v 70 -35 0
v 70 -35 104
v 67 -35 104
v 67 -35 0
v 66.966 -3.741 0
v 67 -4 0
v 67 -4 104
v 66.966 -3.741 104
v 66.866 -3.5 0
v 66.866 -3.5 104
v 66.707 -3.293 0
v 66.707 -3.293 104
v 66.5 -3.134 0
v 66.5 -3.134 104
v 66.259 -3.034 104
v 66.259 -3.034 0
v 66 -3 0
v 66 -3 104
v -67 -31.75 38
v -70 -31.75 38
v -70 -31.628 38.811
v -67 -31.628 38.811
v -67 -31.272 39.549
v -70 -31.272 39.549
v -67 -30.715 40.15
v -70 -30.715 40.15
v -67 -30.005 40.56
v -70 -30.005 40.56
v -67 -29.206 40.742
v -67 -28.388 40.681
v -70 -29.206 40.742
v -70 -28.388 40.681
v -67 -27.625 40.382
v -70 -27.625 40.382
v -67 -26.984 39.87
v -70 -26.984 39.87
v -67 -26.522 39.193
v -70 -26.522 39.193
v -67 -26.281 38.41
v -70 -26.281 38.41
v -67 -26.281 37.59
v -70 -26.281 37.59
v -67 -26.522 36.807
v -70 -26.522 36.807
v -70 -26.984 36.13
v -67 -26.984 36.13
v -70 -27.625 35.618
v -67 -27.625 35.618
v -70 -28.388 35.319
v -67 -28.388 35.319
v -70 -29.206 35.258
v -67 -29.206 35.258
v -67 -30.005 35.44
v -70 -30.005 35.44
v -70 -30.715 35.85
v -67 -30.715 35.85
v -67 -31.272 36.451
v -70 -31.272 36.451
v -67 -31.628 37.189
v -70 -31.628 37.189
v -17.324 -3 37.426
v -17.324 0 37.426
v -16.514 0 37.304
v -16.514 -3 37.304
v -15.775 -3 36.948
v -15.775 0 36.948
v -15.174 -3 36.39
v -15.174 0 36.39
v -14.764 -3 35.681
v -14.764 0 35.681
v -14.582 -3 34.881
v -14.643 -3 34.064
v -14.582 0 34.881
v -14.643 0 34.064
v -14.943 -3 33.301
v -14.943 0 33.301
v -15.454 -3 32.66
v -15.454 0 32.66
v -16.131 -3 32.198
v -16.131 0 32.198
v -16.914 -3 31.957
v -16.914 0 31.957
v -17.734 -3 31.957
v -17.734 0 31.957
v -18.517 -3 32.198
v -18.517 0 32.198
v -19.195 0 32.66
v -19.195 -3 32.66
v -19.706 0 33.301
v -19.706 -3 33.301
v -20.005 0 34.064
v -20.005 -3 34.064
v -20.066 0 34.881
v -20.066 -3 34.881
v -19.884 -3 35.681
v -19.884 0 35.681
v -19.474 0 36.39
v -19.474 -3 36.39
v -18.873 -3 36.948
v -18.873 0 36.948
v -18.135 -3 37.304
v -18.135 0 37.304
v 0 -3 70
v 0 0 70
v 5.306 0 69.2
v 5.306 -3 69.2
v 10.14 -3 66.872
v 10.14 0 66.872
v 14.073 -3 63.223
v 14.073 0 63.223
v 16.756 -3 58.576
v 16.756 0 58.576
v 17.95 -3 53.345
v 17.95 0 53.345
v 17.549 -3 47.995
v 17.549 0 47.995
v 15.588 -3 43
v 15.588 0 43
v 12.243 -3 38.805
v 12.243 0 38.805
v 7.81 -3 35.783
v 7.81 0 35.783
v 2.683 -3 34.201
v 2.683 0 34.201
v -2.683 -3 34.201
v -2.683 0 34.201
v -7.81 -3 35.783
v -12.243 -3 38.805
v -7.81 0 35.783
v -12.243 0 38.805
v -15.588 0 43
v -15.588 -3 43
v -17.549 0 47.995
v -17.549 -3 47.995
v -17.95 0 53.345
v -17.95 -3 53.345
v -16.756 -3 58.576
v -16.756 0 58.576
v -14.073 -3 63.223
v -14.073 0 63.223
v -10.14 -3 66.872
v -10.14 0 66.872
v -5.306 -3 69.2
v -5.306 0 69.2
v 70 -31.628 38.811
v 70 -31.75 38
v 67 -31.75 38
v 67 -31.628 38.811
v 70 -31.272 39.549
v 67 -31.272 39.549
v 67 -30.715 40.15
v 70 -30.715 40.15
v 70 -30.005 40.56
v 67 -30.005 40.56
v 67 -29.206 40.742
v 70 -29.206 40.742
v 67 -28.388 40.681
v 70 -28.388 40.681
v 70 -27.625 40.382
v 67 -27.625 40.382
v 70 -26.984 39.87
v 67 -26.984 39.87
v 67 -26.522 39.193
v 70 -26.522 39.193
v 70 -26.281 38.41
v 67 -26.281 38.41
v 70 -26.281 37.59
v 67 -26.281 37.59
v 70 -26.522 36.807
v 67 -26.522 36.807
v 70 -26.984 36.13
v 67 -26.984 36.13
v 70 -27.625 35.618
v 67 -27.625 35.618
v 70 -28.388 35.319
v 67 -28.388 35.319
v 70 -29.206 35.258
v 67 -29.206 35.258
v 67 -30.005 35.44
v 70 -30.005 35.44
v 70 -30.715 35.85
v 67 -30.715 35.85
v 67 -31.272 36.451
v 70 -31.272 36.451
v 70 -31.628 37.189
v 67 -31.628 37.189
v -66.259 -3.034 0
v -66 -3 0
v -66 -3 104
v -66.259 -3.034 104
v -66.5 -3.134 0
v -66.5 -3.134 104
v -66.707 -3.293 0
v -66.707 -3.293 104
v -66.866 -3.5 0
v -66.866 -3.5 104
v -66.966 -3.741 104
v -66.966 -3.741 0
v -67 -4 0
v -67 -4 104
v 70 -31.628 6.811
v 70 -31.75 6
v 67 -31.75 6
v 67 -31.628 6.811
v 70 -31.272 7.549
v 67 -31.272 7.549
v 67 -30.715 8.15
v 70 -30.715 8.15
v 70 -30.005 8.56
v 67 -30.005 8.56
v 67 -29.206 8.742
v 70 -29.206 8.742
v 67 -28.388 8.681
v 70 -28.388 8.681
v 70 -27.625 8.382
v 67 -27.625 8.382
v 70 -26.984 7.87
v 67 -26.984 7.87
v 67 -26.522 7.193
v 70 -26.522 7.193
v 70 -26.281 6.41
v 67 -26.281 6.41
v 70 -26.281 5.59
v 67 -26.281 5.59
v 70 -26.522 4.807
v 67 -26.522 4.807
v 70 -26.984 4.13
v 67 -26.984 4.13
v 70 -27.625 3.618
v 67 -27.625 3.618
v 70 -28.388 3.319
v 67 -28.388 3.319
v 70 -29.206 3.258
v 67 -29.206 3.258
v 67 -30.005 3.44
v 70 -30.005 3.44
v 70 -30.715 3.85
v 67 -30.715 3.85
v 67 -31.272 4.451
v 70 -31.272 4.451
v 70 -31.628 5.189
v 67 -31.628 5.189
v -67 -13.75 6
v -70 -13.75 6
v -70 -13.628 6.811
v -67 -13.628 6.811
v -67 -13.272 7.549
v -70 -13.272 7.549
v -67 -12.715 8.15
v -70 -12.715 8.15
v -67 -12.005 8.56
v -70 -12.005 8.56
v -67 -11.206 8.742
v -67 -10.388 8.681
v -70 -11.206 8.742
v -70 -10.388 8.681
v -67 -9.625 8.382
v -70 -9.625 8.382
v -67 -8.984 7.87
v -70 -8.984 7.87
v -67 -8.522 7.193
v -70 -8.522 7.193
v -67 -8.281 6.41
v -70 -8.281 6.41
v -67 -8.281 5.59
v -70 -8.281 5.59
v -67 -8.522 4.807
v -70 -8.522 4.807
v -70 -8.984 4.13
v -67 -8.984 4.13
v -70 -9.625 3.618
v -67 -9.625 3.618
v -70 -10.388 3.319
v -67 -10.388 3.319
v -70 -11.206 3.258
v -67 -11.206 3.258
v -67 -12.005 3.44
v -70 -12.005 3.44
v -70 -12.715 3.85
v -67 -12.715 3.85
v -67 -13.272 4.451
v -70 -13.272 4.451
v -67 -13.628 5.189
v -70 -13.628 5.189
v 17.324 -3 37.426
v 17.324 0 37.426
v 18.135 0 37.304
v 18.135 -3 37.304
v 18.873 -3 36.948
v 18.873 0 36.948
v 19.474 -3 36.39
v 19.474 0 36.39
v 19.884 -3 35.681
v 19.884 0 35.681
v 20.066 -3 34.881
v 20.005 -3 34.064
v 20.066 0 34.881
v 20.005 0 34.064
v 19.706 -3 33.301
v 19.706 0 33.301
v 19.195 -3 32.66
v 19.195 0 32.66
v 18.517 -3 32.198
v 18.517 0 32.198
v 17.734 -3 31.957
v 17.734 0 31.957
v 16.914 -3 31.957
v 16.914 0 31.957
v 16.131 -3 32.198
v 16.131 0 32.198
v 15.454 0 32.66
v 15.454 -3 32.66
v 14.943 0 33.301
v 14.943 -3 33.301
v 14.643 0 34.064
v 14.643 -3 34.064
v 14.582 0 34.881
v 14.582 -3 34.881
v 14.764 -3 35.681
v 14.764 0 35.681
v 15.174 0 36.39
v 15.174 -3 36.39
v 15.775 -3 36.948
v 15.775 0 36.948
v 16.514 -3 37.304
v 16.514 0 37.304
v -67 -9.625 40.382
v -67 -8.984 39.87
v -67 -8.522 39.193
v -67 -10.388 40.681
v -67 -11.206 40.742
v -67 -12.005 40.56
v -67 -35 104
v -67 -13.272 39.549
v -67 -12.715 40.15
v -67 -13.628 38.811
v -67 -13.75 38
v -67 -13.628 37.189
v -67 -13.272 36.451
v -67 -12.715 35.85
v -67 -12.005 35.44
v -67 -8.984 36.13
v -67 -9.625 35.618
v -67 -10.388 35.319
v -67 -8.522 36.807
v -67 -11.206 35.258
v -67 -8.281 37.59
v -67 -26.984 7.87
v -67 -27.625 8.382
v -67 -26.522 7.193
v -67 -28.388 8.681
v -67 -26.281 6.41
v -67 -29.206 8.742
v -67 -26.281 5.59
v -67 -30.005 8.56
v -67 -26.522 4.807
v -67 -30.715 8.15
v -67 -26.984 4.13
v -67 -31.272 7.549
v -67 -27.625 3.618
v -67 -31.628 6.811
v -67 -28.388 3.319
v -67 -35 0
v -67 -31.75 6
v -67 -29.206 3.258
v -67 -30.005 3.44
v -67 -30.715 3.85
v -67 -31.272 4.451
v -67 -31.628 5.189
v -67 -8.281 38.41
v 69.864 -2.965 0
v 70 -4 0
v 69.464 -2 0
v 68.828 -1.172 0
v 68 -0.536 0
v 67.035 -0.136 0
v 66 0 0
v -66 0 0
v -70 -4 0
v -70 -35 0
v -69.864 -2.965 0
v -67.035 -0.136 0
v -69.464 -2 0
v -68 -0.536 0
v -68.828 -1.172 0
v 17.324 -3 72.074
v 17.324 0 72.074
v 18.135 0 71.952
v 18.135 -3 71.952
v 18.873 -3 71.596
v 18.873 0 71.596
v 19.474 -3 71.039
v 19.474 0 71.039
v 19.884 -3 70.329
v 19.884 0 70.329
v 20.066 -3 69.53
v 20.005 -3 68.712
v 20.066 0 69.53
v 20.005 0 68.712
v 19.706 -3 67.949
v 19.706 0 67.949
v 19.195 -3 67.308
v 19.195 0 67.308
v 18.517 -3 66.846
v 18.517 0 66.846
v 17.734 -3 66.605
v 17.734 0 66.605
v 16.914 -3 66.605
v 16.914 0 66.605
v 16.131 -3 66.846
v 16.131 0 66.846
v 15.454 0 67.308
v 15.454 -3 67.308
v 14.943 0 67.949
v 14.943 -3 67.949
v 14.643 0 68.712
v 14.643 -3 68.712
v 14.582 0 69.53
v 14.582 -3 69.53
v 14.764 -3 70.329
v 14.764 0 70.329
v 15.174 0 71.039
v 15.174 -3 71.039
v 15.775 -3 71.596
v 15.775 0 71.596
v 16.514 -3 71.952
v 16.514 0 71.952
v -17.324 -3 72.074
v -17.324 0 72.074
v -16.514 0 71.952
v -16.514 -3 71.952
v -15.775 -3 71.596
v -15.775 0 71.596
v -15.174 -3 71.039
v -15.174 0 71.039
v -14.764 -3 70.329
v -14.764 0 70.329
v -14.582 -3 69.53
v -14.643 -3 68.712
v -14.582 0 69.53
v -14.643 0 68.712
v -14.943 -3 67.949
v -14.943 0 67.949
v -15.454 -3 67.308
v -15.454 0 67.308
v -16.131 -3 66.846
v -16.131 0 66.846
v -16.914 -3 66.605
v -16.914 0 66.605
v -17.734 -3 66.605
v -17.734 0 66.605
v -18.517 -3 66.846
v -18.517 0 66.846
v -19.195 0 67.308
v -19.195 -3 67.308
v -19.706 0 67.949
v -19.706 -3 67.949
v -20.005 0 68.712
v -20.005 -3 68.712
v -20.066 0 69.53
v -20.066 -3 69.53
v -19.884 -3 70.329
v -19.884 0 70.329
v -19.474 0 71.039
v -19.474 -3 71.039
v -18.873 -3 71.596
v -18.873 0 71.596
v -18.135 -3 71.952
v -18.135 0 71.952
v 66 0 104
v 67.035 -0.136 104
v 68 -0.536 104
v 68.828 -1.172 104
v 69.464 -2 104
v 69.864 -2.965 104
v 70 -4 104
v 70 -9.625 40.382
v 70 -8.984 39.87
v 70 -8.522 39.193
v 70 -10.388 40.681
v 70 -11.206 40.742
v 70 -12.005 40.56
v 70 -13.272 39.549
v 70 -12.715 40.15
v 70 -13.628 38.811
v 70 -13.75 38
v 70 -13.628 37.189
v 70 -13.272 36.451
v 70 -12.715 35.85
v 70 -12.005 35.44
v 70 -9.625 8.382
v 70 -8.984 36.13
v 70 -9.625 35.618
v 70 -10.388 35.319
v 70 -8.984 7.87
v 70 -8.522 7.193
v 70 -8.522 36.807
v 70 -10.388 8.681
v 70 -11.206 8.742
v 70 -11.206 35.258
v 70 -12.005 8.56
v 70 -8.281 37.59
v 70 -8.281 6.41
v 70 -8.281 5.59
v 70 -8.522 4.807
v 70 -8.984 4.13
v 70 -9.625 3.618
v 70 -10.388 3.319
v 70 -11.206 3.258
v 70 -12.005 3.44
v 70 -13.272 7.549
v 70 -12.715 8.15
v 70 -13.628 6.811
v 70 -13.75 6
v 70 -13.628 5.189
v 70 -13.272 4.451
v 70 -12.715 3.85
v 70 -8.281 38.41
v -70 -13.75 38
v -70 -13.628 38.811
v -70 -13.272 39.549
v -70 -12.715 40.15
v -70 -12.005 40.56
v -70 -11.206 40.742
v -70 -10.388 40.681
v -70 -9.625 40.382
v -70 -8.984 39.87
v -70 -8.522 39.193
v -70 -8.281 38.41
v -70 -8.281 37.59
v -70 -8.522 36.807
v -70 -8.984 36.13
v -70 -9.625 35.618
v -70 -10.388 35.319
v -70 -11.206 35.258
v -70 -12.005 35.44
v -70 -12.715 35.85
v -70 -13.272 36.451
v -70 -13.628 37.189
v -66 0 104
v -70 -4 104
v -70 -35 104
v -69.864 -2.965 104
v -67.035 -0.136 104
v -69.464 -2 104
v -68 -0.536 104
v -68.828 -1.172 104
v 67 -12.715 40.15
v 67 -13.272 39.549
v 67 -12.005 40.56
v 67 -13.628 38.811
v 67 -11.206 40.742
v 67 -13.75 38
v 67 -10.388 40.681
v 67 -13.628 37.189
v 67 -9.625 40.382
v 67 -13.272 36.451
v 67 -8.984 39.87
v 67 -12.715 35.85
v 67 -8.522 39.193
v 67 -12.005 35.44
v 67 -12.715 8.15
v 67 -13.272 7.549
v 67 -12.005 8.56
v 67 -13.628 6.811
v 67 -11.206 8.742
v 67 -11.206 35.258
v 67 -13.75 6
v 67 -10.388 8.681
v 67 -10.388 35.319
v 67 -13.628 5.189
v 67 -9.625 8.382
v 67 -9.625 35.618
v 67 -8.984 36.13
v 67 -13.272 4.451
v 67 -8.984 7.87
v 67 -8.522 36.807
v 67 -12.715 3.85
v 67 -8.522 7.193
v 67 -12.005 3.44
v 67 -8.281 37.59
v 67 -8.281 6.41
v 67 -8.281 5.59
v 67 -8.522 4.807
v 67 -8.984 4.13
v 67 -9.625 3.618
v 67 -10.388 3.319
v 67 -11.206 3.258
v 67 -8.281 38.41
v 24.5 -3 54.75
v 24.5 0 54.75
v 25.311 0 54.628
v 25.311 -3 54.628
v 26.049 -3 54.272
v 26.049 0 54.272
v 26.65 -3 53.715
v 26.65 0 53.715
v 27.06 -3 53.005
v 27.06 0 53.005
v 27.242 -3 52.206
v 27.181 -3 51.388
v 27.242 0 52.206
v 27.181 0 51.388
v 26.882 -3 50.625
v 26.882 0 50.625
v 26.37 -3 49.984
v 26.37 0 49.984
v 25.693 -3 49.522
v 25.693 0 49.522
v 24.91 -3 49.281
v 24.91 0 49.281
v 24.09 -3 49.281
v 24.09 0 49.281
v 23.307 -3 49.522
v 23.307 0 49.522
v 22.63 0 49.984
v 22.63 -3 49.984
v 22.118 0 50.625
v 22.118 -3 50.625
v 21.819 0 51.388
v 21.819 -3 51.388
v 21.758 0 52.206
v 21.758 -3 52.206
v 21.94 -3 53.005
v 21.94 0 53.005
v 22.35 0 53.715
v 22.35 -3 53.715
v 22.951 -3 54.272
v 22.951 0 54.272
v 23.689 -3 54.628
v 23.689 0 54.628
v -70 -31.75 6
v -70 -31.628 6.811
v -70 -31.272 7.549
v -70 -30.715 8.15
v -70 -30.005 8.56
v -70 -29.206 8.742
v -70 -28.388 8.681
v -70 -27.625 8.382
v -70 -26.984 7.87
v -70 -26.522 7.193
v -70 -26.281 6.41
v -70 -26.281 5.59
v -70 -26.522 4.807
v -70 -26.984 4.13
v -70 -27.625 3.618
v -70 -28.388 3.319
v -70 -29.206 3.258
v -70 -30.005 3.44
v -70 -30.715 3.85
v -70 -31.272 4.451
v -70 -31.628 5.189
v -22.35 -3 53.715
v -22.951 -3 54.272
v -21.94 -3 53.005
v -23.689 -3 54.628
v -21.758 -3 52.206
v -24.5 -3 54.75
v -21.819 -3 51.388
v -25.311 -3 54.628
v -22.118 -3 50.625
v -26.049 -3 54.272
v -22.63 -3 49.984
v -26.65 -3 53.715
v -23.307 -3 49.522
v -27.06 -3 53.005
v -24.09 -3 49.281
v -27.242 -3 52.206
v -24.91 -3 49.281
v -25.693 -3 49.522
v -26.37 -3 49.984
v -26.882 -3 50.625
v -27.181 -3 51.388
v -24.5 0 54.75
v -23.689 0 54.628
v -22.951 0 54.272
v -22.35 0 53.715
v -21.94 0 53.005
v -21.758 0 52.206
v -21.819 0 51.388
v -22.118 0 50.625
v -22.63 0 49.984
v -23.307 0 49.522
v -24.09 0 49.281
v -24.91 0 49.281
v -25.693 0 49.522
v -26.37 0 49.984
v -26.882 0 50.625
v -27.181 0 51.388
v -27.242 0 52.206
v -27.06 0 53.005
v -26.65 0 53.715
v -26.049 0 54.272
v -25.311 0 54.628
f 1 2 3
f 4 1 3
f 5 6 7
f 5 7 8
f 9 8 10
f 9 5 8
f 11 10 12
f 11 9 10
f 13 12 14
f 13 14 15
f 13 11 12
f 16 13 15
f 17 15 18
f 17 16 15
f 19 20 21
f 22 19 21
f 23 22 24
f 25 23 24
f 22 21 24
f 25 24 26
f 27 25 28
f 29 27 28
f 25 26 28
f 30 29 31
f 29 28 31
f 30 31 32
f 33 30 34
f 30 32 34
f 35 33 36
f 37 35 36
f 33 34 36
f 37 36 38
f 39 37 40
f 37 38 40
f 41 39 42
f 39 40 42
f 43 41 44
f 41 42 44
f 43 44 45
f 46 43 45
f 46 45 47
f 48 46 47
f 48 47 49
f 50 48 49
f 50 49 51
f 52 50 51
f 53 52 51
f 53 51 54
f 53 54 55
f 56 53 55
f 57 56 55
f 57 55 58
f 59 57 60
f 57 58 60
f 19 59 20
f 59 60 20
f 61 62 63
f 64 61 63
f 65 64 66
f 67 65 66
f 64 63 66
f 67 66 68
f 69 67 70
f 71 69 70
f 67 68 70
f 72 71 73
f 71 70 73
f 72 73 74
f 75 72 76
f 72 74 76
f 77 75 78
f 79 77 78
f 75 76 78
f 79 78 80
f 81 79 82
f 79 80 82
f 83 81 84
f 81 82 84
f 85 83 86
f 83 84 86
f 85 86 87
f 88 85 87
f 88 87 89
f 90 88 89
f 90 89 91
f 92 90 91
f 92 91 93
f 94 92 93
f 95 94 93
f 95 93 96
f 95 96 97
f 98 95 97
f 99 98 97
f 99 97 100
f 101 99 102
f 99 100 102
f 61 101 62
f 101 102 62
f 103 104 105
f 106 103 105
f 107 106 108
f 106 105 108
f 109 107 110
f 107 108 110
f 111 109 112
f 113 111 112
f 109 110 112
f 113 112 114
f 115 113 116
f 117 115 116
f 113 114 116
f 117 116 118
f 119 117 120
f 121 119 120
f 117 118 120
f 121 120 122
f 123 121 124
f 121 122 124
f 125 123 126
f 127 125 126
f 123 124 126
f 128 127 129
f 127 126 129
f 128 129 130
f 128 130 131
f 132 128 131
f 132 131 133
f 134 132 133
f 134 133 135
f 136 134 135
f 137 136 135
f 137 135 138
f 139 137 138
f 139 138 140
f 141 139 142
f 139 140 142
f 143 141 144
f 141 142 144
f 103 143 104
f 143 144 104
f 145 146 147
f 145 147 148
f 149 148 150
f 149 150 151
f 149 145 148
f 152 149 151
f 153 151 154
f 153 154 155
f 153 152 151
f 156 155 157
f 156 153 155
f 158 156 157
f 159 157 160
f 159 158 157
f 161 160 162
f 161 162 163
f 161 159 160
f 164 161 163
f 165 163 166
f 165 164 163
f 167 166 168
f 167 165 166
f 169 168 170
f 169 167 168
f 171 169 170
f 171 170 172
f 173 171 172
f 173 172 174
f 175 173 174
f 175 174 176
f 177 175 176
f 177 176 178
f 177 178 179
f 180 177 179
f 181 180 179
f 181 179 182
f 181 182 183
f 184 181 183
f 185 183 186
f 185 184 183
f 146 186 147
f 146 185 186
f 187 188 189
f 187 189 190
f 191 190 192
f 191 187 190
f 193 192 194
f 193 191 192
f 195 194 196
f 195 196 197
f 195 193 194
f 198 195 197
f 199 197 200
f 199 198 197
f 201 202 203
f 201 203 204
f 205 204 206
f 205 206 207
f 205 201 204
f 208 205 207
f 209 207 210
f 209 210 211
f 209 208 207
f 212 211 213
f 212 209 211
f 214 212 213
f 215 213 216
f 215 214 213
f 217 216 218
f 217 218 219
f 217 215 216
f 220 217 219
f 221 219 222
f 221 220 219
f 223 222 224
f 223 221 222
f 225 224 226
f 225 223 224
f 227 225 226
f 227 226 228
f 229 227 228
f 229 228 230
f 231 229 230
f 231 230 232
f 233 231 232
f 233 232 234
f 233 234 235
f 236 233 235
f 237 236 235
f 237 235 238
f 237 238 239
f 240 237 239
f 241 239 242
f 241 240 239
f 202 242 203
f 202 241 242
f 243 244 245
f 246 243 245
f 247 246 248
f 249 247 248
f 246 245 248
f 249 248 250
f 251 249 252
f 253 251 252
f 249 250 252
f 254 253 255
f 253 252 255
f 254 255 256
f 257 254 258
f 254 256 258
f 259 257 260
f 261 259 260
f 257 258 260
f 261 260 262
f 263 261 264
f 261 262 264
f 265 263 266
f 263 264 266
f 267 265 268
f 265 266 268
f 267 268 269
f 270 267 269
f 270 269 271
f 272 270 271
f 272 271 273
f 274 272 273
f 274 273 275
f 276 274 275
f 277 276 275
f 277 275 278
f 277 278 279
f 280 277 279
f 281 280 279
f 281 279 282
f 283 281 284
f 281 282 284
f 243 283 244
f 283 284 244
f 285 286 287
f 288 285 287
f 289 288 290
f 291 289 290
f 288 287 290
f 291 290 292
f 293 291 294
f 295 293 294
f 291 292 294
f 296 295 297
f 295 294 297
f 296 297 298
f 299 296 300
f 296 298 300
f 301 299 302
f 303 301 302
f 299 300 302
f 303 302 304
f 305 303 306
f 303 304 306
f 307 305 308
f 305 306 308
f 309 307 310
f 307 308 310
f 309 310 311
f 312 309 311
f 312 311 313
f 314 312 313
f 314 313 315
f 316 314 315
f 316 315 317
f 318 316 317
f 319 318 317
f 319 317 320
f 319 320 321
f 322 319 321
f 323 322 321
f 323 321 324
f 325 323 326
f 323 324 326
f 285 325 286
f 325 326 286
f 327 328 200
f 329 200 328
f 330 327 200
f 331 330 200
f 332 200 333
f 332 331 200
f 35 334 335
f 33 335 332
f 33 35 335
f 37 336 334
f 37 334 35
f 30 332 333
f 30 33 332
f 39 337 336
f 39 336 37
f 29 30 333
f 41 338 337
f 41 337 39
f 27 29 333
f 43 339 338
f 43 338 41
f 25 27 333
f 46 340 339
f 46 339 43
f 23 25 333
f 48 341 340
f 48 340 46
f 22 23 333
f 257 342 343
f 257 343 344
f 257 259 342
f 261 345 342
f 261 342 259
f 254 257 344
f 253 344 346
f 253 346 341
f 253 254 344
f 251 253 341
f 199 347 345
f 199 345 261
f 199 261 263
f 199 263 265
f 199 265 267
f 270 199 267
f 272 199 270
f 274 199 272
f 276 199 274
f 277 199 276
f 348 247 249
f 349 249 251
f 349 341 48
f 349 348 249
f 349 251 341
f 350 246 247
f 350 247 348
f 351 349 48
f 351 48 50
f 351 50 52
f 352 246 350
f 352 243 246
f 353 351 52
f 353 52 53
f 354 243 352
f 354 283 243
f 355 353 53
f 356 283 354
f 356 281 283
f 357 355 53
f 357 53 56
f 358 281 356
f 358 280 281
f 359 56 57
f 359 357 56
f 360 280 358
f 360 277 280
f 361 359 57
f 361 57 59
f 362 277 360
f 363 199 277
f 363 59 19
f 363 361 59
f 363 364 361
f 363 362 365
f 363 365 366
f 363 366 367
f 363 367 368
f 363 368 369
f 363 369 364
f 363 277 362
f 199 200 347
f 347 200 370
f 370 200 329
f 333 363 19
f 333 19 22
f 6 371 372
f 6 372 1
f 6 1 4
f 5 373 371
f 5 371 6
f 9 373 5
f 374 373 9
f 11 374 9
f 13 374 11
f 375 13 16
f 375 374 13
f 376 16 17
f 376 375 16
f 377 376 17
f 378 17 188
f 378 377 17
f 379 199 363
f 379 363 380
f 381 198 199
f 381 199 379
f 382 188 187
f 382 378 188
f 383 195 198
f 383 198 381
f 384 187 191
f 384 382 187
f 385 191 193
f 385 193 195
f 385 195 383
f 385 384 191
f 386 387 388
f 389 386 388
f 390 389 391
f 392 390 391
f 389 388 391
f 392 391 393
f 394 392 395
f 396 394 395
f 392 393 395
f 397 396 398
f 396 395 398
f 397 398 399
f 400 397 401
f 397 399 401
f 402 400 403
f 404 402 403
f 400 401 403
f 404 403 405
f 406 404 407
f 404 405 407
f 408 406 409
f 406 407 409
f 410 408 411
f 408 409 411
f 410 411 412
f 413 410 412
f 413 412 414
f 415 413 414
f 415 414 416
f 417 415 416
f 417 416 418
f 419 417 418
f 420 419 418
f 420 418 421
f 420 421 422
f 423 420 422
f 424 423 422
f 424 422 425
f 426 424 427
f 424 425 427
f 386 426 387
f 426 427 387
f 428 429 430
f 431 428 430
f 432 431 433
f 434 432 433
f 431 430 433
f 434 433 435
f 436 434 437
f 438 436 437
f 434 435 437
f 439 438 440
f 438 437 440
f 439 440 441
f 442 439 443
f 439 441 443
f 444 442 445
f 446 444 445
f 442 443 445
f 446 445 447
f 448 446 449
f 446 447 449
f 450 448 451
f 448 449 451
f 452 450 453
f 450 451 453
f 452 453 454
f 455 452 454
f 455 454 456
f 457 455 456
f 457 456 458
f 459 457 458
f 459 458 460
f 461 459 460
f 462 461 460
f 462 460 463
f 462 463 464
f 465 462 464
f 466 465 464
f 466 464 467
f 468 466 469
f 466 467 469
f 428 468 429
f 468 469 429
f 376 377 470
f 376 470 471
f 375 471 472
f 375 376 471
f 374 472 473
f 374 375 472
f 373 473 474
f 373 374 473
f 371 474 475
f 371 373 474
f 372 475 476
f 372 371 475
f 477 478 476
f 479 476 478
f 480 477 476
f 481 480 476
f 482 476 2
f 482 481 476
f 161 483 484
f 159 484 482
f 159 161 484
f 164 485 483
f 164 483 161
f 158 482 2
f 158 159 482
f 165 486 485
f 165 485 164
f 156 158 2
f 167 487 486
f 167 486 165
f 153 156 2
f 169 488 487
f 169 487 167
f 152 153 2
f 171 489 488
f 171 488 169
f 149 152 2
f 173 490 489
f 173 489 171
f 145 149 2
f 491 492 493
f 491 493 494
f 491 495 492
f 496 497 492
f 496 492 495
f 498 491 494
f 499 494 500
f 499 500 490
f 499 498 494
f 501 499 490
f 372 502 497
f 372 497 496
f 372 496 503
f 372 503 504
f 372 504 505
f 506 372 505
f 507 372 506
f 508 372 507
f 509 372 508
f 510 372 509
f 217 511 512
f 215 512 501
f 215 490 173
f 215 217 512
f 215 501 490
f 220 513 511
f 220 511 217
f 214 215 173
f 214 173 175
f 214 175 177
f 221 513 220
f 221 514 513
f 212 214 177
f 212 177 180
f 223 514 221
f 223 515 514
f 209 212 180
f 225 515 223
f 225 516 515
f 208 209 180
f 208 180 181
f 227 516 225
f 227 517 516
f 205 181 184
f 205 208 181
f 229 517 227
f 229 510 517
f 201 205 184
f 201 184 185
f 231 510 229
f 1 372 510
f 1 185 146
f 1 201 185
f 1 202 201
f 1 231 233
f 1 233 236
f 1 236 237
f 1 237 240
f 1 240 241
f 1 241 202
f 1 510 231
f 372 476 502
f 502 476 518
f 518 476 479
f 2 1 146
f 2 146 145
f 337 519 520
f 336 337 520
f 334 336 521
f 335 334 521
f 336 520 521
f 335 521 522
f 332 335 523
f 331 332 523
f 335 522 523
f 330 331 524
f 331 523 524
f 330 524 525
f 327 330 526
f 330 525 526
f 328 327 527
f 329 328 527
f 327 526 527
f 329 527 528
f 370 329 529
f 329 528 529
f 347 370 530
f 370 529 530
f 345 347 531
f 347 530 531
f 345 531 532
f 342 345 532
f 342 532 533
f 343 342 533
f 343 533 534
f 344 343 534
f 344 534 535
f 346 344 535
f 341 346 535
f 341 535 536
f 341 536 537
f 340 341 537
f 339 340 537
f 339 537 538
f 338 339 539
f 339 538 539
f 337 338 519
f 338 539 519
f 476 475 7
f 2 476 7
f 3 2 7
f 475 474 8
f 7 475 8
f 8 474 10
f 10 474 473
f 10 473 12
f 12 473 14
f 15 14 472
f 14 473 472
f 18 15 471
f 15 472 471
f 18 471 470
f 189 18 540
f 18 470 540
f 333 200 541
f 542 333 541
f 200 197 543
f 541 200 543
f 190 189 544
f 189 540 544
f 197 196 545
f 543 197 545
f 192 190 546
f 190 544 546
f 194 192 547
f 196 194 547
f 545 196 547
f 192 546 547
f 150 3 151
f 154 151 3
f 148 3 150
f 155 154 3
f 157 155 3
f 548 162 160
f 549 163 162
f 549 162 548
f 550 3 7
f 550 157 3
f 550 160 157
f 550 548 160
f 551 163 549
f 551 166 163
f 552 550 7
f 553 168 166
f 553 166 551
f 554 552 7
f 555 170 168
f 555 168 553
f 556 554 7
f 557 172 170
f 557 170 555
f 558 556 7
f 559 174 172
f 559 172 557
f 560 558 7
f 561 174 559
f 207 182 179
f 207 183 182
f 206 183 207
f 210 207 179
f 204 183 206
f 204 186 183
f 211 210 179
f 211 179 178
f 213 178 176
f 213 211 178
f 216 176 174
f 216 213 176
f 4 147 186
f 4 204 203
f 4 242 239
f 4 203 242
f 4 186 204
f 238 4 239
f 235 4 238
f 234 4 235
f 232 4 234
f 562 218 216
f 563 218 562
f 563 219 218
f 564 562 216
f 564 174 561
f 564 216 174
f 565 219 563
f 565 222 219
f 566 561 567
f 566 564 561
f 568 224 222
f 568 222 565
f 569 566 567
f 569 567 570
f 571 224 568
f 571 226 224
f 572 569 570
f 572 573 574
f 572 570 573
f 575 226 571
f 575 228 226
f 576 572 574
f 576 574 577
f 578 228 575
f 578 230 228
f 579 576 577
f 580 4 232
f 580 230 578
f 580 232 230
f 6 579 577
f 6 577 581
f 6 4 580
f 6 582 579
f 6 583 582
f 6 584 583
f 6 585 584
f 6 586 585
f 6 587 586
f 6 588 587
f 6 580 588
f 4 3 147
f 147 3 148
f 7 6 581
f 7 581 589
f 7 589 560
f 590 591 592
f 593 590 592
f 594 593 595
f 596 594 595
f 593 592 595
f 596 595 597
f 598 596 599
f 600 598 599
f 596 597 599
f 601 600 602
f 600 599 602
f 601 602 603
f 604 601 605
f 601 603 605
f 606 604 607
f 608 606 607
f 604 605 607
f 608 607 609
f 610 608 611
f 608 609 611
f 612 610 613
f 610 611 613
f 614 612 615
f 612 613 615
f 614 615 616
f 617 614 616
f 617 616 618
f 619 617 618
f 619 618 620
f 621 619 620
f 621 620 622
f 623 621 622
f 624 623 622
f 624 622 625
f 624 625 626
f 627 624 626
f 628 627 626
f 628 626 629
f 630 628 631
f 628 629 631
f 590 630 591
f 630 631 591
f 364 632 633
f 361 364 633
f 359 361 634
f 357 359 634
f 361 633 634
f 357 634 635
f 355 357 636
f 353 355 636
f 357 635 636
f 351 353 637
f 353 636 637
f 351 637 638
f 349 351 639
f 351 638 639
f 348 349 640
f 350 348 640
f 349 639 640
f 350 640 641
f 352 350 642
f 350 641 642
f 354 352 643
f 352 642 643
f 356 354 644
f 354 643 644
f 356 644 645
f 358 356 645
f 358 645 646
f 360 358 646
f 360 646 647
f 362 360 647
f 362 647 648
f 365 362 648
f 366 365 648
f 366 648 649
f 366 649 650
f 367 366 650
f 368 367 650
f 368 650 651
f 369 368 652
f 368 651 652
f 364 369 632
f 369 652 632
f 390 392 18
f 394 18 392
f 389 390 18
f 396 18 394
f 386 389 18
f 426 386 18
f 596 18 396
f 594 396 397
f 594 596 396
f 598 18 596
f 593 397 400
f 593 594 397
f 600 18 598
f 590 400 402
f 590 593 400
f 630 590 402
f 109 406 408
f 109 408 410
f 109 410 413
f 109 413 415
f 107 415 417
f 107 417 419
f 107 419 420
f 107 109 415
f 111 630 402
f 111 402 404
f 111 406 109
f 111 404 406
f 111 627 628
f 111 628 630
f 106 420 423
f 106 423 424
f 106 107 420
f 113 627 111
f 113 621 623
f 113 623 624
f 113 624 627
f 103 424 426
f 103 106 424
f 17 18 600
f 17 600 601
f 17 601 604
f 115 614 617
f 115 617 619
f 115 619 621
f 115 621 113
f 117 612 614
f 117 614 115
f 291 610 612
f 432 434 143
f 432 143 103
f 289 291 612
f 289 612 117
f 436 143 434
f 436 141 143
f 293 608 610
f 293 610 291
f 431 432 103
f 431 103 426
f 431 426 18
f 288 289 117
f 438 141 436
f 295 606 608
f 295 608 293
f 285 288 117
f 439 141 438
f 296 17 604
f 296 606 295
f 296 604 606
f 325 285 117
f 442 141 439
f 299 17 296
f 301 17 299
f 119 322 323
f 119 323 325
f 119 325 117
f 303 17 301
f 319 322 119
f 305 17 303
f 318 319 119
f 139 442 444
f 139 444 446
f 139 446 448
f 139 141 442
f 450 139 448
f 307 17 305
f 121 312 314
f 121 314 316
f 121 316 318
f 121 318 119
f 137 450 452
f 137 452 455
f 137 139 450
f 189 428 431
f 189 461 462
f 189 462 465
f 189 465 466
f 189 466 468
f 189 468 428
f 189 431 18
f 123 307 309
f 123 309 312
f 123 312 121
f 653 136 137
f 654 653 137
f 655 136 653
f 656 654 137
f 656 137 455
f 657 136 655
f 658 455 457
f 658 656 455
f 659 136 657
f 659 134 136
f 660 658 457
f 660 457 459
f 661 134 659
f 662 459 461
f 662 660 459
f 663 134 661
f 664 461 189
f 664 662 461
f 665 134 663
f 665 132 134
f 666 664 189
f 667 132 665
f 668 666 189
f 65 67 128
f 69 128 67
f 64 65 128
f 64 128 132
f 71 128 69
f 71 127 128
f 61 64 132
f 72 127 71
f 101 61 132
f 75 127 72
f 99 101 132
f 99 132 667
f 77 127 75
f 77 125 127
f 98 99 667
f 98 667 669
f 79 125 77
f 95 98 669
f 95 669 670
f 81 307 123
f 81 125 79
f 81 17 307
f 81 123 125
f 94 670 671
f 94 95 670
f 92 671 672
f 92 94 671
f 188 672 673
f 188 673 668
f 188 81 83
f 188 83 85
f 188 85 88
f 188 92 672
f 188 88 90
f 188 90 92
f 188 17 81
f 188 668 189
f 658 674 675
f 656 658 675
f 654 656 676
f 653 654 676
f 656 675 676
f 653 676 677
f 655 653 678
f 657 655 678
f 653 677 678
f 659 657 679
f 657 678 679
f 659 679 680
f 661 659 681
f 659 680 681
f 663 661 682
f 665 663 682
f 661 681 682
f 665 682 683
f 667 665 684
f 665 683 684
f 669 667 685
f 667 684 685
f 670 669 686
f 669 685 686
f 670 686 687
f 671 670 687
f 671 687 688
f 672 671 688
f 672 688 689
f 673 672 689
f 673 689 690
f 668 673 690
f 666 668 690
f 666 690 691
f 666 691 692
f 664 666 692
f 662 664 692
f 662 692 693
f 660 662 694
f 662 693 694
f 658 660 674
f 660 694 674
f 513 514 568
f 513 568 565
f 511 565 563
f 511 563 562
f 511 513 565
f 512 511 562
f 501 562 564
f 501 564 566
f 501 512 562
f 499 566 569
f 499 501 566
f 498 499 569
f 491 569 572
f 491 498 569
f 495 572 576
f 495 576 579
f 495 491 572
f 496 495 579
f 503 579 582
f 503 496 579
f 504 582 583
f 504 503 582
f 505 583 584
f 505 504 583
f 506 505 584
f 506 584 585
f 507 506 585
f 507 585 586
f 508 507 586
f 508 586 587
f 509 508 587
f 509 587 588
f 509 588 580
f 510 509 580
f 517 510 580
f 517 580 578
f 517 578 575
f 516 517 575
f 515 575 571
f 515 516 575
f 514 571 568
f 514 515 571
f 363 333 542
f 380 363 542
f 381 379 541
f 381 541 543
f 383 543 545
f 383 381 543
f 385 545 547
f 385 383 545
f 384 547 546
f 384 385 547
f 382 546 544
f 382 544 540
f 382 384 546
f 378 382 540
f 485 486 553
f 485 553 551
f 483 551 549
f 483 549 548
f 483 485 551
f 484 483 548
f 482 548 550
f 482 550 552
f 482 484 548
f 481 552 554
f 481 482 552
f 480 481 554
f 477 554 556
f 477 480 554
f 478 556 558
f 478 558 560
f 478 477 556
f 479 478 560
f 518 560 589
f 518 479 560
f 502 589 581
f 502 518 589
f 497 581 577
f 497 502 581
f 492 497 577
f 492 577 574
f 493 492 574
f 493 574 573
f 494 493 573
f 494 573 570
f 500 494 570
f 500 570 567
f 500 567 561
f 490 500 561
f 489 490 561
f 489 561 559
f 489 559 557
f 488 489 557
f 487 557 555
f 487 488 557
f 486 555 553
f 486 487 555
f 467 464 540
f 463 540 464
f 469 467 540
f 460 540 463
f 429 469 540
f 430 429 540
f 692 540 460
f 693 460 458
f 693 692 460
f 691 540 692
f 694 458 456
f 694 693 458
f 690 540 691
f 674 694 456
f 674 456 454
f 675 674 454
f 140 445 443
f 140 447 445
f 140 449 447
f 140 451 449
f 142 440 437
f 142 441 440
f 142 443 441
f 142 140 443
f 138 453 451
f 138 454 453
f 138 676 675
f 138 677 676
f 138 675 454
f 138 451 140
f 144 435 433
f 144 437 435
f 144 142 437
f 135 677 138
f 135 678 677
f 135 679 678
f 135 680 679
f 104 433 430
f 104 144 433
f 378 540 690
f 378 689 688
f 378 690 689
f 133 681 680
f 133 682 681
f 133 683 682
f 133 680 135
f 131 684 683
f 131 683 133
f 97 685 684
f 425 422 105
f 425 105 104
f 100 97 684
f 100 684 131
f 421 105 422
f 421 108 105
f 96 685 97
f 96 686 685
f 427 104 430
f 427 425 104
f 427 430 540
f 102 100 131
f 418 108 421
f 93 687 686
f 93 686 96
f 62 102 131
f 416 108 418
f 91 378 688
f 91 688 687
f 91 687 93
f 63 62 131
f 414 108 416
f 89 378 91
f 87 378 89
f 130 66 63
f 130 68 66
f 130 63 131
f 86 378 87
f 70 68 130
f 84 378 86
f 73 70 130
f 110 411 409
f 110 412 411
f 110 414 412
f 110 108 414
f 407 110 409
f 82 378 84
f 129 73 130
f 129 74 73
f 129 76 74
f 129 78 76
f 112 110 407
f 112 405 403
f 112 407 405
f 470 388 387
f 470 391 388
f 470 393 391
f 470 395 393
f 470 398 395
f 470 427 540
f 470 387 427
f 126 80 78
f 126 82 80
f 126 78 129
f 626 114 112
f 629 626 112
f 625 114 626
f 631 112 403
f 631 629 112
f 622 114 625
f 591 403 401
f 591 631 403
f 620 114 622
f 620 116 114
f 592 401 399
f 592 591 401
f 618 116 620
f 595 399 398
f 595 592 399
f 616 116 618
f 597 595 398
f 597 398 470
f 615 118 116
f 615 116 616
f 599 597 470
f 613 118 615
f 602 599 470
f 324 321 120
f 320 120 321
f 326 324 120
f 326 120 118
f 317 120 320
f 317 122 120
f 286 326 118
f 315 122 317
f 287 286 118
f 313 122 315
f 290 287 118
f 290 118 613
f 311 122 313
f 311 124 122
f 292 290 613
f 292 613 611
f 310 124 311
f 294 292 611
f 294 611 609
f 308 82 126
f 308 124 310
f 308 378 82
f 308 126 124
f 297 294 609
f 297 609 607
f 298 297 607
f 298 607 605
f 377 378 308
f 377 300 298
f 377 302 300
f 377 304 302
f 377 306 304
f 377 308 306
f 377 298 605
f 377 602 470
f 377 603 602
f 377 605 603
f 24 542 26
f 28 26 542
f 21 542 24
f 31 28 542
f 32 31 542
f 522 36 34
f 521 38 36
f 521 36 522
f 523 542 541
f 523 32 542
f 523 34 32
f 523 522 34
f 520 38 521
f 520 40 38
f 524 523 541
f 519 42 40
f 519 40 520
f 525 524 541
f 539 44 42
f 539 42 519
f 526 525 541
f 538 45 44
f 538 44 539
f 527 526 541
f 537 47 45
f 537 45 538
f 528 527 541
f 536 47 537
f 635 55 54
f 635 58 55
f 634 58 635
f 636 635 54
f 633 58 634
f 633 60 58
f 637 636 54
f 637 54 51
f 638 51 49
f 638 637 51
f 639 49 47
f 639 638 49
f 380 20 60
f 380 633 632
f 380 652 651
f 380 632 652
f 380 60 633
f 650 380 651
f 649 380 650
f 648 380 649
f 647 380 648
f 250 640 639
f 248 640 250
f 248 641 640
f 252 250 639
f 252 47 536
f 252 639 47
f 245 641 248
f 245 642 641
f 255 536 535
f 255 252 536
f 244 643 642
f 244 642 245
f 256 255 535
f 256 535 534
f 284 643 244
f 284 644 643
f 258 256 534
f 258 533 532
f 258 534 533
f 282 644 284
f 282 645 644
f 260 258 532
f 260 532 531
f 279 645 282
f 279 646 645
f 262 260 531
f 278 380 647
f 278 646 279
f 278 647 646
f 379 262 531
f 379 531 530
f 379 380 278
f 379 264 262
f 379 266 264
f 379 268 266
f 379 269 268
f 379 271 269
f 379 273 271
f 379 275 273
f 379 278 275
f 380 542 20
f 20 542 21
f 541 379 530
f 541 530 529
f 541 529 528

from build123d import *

# Parameters (mm, degrees)
SM_BASE_FLANGE_1_DEPTH = 104
SKETCH_6_R             = 2.75
CUT_EXTRUDE_1_DEPTH    = 3
SKETCH_7_R             = 2.75
CUT_EXTRUDE_3_DEPTH    = 3
SKETCH_8_R             = 18
CUT_EXTRUDE_4_DEPTH    = 3


# Sheet-metal steps are written as plain solids
with BuildPart() as part:
    # Sketch 1 → 基体-法兰1 (new body)
    with BuildSketch(Plane.XY):
        with BuildLine():
            Line((-70, -35), (-70, -4))
            ThreePointArc((-70, -4), (-68.828427125, -1.171572875), (-66, 0))
            Line((-66, 0), (66, 0))
            ThreePointArc((66, 0), (68.828427125, -1.171572875), (70, -4))
            Line((70, -4), (70, -35))
            Line((70, -35), (67, -35))
            Line((67, -35), (67, -4))
            ThreePointArc((67, -4), (66.707106781, -3.292893219), (66, -3))
            Line((66, -3), (-66, -3))
            ThreePointArc((-66, -3), (-66.707106781, -3.292893219), (-67, -4))
            Line((-67, -4), (-67, -35))
            Line((-67, -35), (-70, -35))
        make_face()
    extrude(amount=SM_BASE_FLANGE_1_DEPTH)

    # 草图6 → 切除-拉伸1 (cut)
    with BuildSketch(Plane(origin=(0, 0, 0), x_dir=(1, 0, 0), z_dir=(0, 1, 0))):
        with Locations(Location((24.5, -52, 0), (0, 0, 270))):
            Circle(SKETCH_6_R)
        with Locations(Location((17.324116139, -69.324116139, 0), (0, 0, 270))):
            Circle(SKETCH_6_R)
        with Locations(Location((-17.324116139, -69.324116139, 0), (0, 0, 270))):
            Circle(SKETCH_6_R)
        with Locations(Location((-24.5, -52, 0), (0, 0, 270))):
            Circle(SKETCH_6_R)
        with Locations(Location((-17.324116139, -34.675883861, 0), (0, 0, 270))):
            Circle(SKETCH_6_R)
        with Locations(Location((17.324116139, -34.675883861, 0), (0, 0, 270))):
            Circle(SKETCH_6_R)
    extrude(amount=-CUT_EXTRUDE_1_DEPTH, mode=Mode.SUBTRACT)

    # 草图7 → 切除-拉伸3 (cut)
    with BuildSketch(Plane.ZY.offset(70)):
        with Locations(Location((38, -29, 0), (0, 0, 270))):
            Circle(SKETCH_7_R)
        with Locations(Location((38, -11, 0), (0, 0, 270))):
            Circle(SKETCH_7_R)
        with Locations(Location((6, -11, 0), (0, 0, 270))):
            Circle(SKETCH_7_R)
        with Locations(Location((6, -29, 0), (0, 0, 270))):
            Circle(SKETCH_7_R)
    cut_extrude_3 = extrude(amount=-CUT_EXTRUDE_3_DEPTH, mode=Mode.SUBTRACT)

    # 镜向2: 切除-拉伸3 across plane
    add(cut_extrude_3.mirror(Plane(origin=(0, 0, 0), x_dir=(0, 0, 1), z_dir=(1, 0, 0))), mode=Mode.SUBTRACT)

    # 草图8 → 切除-拉伸4 (cut)
    with BuildSketch(Plane(origin=(0, 0, 0), x_dir=(1, 0, 0), z_dir=(0, 1, 0))):
        with Locations(Location((0, -52, 0), (0, 0, 270))):
            Circle(SKETCH_8_R)
    extrude(amount=-CUT_EXTRUDE_4_DEPTH, mode=Mode.SUBTRACT)


solid = part.part
